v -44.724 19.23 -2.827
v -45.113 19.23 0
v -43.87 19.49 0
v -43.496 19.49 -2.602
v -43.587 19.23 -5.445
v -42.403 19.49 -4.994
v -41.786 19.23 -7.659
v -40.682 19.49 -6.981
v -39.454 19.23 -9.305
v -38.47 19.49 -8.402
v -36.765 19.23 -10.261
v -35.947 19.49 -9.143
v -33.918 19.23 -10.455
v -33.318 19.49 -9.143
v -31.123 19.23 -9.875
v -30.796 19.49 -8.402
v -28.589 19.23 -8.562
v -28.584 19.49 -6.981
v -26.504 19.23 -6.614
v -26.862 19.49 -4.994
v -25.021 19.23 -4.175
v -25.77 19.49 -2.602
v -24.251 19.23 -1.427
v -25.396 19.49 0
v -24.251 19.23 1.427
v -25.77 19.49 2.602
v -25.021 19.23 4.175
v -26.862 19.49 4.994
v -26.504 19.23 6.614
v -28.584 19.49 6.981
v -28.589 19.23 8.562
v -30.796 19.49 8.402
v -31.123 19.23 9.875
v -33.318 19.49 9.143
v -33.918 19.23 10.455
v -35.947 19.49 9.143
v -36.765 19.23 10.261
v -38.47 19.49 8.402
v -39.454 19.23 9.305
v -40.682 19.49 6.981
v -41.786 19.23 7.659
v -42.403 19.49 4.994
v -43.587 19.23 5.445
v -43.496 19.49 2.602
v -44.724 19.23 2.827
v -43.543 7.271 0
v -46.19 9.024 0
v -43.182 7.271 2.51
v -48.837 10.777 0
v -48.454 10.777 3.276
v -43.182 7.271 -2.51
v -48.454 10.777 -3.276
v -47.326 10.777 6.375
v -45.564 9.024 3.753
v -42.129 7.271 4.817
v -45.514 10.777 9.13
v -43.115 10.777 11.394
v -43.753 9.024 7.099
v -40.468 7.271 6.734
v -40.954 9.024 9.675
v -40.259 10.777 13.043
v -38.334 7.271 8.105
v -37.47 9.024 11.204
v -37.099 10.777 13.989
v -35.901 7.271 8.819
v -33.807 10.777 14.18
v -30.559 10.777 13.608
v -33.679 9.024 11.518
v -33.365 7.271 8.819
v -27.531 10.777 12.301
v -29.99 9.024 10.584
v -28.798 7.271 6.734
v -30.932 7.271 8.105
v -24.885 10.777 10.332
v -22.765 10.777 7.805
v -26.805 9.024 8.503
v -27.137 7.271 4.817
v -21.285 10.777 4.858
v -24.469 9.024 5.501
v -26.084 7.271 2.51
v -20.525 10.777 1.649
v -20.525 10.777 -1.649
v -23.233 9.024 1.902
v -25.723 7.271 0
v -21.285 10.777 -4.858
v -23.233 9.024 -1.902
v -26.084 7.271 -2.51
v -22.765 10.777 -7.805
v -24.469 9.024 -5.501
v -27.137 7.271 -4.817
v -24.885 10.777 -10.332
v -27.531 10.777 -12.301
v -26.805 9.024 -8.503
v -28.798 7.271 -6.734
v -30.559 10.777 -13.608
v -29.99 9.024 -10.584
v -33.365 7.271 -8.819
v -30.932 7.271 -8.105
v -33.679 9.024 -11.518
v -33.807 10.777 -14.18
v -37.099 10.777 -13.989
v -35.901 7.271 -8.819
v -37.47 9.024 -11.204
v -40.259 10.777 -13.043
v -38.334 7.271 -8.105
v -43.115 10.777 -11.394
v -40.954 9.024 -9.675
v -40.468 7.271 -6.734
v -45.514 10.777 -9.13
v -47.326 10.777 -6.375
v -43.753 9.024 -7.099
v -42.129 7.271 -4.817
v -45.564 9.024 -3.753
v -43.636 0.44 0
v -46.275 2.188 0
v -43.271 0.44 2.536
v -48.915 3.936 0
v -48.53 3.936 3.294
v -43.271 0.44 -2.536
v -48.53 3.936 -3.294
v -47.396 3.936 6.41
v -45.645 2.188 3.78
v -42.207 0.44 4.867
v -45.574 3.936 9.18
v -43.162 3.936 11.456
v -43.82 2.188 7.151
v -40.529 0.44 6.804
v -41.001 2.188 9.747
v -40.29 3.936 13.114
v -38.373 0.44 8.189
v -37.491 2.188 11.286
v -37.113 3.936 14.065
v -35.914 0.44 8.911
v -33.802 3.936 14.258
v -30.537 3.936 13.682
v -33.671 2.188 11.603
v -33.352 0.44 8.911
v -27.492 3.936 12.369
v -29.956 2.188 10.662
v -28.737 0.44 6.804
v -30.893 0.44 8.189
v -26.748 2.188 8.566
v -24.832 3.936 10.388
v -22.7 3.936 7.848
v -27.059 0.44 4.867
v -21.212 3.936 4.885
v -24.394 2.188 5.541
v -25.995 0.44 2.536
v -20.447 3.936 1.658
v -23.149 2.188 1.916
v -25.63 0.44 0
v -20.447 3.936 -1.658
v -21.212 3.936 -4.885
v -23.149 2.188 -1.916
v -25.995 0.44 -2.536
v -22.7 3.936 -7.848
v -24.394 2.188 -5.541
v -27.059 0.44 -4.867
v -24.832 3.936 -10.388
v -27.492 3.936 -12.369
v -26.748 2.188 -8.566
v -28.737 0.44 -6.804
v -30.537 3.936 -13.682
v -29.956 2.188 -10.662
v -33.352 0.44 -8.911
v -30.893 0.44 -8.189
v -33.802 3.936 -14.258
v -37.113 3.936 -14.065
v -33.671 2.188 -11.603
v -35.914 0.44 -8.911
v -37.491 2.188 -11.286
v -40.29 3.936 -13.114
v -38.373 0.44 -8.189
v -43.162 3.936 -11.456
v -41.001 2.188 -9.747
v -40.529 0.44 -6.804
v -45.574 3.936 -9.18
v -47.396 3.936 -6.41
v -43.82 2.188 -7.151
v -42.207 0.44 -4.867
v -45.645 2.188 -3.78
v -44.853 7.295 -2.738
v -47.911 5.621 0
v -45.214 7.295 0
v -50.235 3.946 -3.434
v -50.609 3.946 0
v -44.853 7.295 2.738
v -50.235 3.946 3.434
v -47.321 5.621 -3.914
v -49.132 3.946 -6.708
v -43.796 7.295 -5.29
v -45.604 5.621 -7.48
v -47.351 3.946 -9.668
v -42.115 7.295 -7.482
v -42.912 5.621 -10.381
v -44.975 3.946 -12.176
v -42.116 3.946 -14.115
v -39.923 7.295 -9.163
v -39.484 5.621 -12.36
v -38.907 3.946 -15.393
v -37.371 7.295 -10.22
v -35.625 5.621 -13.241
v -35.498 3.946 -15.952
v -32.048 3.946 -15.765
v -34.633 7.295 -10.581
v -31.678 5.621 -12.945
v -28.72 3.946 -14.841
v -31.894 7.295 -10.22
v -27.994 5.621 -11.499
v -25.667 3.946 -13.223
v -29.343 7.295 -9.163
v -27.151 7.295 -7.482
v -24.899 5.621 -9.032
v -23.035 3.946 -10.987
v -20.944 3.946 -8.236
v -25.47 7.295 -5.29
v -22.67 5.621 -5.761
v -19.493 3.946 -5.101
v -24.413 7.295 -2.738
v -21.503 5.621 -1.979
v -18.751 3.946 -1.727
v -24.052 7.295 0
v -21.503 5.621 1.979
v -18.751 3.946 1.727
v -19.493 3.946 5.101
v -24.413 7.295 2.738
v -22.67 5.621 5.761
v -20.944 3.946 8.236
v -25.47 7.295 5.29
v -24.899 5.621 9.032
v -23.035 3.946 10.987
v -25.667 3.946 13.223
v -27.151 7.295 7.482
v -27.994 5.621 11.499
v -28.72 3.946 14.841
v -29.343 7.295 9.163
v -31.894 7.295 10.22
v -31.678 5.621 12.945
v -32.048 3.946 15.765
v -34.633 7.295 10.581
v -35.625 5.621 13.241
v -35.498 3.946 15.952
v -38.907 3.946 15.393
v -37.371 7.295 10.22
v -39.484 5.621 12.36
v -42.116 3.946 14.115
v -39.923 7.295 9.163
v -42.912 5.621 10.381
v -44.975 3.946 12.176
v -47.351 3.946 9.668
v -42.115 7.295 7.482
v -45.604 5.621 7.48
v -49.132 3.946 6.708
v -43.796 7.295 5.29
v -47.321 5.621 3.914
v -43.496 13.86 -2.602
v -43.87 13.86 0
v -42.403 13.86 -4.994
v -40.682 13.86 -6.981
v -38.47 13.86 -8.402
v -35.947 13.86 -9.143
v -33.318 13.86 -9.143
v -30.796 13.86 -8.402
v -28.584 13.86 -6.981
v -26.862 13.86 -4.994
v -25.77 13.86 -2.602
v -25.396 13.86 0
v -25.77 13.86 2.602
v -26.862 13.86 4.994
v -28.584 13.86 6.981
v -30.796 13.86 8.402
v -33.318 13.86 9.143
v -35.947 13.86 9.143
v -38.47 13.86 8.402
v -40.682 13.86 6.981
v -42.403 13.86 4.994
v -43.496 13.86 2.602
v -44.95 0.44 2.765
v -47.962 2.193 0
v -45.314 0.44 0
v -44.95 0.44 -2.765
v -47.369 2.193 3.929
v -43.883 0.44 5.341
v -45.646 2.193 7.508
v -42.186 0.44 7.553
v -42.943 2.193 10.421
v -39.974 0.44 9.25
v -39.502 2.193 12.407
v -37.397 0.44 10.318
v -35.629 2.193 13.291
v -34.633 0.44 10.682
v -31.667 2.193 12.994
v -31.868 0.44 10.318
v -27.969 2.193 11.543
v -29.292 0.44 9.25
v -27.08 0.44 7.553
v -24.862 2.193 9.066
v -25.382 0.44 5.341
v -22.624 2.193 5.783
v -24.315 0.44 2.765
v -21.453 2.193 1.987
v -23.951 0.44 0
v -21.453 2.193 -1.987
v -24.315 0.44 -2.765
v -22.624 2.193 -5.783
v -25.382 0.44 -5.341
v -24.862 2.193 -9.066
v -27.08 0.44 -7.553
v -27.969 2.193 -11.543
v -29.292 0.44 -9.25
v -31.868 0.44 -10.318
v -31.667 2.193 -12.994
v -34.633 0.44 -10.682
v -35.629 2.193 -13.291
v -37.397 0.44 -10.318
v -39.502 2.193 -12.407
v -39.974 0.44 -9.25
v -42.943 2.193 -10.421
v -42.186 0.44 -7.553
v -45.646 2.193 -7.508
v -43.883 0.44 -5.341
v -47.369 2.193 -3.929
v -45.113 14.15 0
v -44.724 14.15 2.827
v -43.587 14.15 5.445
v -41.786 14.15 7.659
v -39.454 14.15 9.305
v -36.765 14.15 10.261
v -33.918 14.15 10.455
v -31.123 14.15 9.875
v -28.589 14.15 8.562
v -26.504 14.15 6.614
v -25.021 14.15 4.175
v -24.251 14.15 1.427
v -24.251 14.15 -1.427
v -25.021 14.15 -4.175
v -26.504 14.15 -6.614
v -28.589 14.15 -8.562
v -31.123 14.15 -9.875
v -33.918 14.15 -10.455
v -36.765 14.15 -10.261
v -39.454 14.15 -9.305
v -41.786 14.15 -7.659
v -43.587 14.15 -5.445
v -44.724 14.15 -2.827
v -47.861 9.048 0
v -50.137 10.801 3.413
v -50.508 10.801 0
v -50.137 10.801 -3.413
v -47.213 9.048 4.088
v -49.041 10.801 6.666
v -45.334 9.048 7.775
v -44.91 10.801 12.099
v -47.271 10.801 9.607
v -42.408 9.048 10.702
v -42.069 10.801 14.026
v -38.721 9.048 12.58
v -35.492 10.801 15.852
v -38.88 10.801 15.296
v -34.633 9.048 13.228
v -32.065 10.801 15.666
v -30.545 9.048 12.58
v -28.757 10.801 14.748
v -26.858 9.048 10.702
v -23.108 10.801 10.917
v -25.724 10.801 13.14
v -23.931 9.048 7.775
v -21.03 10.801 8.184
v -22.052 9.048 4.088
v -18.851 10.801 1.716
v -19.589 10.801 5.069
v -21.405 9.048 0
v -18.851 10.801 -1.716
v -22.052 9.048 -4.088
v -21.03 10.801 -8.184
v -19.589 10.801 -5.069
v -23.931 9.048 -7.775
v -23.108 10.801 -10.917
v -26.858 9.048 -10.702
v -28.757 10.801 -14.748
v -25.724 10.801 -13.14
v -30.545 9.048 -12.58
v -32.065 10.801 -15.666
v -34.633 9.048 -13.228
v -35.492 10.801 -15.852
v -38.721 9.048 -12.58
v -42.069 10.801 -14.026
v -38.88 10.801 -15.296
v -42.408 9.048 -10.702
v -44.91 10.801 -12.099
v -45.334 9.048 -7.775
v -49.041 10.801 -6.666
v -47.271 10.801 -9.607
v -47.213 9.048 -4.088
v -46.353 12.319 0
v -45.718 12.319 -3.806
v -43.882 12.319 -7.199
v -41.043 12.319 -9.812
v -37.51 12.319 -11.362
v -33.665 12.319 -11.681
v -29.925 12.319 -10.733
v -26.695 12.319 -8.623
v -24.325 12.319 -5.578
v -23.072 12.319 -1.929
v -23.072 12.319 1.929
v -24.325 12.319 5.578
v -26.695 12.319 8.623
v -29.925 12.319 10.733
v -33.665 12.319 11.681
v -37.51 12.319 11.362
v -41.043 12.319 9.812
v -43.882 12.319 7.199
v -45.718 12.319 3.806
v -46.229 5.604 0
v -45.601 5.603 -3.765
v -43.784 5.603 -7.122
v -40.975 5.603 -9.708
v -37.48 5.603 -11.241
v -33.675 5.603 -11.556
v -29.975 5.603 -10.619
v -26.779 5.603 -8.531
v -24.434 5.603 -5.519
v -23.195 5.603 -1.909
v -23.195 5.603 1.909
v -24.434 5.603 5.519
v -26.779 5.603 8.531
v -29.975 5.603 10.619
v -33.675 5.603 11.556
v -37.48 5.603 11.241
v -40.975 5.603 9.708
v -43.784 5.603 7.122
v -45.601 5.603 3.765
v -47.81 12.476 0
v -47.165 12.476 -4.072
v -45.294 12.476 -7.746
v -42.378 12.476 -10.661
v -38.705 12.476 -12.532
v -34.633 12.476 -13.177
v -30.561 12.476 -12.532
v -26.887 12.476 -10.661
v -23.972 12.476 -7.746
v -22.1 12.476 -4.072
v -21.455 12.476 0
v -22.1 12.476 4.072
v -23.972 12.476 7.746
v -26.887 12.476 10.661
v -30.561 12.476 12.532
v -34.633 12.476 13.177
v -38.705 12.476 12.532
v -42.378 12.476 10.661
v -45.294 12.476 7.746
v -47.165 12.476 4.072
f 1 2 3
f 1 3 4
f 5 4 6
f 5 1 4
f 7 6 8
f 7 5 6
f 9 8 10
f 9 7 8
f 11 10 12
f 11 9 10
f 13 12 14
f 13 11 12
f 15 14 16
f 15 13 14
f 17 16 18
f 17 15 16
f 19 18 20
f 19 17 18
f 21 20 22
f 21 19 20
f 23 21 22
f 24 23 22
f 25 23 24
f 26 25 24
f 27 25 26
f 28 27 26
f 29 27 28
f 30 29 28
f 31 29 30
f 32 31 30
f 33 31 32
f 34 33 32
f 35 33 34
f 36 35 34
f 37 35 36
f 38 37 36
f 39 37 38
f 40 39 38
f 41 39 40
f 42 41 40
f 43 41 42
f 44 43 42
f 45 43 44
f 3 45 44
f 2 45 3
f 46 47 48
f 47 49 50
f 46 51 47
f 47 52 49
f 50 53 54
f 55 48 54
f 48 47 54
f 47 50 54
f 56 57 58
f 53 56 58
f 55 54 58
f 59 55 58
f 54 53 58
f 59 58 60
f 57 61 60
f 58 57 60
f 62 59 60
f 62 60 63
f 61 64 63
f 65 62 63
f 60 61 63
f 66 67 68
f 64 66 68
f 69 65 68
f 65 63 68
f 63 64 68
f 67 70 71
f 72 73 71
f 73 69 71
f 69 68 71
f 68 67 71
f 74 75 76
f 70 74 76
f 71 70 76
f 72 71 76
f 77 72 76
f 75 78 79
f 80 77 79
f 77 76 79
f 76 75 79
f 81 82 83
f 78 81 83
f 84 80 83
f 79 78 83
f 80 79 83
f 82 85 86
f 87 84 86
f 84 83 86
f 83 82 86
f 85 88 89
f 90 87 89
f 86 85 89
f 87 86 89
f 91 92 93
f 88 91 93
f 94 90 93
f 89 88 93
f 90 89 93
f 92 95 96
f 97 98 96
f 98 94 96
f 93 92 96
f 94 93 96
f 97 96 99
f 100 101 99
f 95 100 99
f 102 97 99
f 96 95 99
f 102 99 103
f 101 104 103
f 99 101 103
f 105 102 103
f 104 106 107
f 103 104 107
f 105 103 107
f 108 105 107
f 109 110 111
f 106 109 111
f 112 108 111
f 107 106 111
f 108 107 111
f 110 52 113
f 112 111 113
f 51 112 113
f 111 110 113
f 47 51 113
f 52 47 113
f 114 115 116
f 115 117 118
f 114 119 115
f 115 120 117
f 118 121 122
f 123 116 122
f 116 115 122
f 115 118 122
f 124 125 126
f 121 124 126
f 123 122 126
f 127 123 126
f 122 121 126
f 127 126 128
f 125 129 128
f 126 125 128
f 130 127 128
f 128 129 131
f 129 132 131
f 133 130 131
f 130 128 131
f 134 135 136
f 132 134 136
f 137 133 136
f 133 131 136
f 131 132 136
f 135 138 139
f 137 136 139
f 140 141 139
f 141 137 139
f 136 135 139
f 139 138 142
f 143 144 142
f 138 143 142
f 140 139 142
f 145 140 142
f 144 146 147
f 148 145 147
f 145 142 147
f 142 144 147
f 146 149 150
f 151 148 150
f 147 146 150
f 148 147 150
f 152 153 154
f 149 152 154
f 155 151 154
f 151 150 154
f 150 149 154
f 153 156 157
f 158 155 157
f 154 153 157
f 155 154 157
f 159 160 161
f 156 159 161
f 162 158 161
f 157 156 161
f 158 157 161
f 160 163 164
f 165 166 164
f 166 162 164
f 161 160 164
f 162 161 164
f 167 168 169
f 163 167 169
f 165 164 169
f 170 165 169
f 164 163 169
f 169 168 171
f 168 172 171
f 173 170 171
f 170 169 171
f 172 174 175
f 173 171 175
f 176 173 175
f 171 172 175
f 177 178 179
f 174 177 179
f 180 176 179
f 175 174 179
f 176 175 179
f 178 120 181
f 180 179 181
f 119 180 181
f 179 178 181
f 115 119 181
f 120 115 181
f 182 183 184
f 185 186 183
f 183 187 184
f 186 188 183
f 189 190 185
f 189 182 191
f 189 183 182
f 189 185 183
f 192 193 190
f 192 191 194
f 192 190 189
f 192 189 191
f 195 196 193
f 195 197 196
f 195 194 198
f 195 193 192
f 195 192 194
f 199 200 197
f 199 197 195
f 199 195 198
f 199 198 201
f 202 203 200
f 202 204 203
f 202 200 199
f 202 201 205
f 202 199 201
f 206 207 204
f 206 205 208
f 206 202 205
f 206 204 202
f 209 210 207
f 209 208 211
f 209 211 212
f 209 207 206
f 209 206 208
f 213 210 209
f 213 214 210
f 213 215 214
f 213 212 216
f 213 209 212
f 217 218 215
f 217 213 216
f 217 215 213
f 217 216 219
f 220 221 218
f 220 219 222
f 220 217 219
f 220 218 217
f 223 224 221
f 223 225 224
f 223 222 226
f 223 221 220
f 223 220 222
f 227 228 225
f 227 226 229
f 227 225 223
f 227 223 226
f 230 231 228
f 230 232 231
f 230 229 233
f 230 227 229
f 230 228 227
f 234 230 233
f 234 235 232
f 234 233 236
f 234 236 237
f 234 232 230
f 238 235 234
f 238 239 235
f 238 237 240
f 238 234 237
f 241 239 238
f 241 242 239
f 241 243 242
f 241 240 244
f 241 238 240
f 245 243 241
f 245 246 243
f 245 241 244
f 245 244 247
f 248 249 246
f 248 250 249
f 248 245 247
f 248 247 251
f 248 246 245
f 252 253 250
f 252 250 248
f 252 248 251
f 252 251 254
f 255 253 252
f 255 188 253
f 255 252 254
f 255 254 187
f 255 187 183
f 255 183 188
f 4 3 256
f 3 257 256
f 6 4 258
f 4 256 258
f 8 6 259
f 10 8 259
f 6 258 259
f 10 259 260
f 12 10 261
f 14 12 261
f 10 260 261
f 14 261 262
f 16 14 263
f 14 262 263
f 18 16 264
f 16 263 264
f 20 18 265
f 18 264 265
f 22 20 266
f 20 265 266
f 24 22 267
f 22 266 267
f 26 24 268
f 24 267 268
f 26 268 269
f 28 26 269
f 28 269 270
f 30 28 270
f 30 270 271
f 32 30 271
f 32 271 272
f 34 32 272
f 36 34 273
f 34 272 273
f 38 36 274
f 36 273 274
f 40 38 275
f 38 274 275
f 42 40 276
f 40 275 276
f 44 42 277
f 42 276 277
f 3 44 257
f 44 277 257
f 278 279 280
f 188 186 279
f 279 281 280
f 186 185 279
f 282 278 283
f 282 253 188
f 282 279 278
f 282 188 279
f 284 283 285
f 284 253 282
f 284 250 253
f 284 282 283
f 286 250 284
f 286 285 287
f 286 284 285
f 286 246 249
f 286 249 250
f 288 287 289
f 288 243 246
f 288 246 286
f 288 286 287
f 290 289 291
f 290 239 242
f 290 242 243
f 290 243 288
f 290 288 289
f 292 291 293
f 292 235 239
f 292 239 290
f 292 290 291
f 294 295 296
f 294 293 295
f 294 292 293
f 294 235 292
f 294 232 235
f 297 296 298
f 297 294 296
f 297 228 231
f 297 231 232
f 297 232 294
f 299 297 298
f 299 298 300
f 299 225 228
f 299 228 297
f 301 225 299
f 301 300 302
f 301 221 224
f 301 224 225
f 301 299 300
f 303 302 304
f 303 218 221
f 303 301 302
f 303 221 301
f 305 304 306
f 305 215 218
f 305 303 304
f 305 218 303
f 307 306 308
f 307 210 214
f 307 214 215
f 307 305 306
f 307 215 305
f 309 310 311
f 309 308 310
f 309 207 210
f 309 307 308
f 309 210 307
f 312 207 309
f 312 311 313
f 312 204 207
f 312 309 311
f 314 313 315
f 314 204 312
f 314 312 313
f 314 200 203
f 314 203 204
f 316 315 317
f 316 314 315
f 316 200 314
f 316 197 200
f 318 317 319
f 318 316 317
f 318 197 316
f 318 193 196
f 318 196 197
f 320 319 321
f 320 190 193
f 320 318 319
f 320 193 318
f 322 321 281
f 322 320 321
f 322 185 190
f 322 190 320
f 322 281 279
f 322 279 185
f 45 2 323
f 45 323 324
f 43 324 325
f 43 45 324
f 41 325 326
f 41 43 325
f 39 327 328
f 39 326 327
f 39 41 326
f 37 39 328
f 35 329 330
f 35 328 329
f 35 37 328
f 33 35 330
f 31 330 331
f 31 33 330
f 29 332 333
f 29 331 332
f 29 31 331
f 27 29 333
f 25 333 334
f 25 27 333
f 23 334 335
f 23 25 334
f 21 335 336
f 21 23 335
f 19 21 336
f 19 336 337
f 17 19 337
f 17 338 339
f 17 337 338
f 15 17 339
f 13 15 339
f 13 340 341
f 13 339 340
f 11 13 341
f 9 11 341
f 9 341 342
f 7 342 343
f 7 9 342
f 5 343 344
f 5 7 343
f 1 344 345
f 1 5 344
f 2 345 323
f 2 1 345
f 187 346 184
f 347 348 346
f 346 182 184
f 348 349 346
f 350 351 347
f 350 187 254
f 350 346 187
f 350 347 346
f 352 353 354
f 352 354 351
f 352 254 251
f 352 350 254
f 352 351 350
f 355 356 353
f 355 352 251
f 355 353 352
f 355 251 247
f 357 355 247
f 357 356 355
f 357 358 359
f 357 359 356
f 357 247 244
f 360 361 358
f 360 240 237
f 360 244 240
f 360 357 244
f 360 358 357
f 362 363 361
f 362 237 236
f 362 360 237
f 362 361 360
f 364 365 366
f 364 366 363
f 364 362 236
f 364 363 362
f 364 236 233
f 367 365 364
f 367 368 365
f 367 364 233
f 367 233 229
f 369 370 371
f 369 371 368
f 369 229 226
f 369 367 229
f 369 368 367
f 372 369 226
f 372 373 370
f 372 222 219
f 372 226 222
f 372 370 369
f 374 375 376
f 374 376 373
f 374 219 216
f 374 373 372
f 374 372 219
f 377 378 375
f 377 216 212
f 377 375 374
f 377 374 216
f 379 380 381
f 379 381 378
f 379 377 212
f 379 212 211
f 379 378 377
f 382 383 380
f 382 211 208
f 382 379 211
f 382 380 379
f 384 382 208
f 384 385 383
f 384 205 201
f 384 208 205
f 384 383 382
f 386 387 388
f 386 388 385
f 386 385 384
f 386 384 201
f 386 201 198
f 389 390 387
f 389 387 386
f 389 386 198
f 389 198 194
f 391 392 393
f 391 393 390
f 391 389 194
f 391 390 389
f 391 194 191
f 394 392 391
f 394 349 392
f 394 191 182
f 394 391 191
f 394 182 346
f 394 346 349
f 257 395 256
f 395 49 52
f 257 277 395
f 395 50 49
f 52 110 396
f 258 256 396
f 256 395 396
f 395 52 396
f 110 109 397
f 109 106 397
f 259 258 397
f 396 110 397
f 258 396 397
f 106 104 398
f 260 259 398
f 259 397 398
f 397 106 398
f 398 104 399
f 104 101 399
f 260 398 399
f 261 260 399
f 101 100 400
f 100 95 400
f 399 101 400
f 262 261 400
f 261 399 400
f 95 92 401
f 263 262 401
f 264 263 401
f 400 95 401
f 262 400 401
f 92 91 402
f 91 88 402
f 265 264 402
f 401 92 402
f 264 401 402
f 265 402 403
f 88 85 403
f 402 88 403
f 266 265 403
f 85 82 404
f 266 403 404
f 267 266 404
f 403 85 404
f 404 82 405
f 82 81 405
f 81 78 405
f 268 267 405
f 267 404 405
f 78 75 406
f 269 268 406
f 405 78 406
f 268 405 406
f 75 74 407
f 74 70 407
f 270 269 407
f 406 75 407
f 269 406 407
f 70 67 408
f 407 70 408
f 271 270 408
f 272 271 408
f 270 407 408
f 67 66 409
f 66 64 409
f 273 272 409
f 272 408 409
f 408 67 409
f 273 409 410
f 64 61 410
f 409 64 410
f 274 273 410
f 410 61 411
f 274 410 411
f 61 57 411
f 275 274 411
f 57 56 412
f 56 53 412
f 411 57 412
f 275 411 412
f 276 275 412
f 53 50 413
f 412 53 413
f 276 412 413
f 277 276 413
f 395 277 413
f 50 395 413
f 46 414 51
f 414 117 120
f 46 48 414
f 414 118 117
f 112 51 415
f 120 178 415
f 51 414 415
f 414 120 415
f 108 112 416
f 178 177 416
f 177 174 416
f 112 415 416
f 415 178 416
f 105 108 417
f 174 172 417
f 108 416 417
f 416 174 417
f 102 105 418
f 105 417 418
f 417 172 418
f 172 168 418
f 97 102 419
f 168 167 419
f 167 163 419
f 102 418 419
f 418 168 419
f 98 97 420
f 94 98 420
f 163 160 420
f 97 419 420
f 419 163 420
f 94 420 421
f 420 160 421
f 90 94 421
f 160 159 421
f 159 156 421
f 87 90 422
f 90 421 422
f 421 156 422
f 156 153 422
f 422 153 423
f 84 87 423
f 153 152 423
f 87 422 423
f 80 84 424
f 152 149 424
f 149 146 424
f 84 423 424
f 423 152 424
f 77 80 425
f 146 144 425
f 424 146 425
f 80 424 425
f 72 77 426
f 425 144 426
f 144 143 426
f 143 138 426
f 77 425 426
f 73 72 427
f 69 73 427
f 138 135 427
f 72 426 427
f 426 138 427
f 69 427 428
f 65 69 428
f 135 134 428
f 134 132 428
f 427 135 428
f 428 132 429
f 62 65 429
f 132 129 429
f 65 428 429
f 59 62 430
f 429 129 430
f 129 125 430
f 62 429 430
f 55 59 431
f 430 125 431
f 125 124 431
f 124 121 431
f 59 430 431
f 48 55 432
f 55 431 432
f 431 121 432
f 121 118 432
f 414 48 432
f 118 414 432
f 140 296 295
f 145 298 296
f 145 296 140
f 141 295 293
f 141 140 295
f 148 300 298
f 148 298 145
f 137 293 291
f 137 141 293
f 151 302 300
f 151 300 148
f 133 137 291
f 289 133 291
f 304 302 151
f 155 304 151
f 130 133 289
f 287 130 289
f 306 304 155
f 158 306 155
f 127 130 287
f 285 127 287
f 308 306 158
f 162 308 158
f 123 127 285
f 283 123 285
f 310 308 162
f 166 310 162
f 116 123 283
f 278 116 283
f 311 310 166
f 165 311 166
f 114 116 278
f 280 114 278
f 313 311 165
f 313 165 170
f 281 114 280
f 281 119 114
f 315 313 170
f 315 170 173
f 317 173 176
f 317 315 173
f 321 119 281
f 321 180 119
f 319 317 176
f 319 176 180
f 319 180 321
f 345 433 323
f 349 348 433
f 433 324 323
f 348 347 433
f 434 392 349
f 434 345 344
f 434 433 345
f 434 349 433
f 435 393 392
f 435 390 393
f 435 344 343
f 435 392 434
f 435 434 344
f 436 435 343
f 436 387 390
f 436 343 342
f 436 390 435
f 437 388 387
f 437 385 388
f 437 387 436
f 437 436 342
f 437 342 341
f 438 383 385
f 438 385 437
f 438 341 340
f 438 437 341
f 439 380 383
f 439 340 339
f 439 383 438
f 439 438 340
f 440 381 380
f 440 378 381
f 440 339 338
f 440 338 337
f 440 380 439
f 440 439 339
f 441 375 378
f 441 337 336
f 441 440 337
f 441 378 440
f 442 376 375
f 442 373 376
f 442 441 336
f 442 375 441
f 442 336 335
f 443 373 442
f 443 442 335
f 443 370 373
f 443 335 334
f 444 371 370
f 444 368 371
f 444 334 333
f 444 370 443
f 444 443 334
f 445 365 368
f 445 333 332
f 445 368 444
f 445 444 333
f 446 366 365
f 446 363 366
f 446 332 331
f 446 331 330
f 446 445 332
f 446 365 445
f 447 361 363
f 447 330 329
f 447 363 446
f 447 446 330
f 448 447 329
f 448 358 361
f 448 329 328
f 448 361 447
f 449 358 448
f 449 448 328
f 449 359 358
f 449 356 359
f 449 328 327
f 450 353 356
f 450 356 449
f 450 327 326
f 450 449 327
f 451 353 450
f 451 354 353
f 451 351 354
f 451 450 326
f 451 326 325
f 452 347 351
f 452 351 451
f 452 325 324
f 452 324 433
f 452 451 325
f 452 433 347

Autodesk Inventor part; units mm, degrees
ref_plane "YZ Plane" through (0, 0, 0) normal (1, 0, 0) x (0, 1, 0)
ref_plane "XZ Plane" through (0, 0, 0) normal (0, 1, 0) x (-1, 0, 0)
ref_plane "XY Plane" through (0, 0, 0) normal (0, 0, 1) x (1, 0, 0)
sketch "Sketch1" plane through (0, 0, 0) normal (0, 0, 1) x (1, 0, 0)
  line L0 (-45.1128, 14.1503) -> (-50.5079, 10.8014)
  line L1 (-50.5079, 10.8014) -> (-45.2136, 7.2953)
  line L2 (-45.2136, 7.2953) -> (-50.6087, 3.9464)
  line L3 (-50.6087, 3.9464) -> (-45.3144, 0.4403)
  line L4 (-45.1128, 14.1503) -> (-45.1128, 19.2303)
  line L5 (-43.8697, 19.4903) -> (-45.1128, 19.2303)
  line L6 (-34.6329, 29.115) -> (-34.6329, -7.5025)
  line L7 (-43.8697, 13.8605) -> (-48.8373, 10.7769)
  line L8 (-48.8373, 10.7769) -> (-43.543, 7.2708)
  line L9 (-43.543, 7.2708) -> (-48.9149, 3.9362)
  line L10 (-43.8697, 19.4903) -> (-43.8697, 13.8605)
  line L11 (-48.9149, 3.9362) -> (-43.6359, 0.4403)
  line L12 (-43.6359, 0.4403) -> (-45.3144, 0.4403)
  point P0 (0, 0)
  dimension "d0" = 6.35
  dimension "d1" = 6.35
  dimension "d2" = 5.08
  dimension "d3" = 1.27
  dimension "d4" = 15.875
  dimension "d6" = 6.35
  dimension "d10" = 1.6784
  dimension "d11" = 19.05
revolve "Revolution1" add sketch "Sketch1" angle 360 about axis through (-34.6329, 29.115, 0) along (0, -1, 0)
properties part number "Small Suction Cup Part 1 1764"
